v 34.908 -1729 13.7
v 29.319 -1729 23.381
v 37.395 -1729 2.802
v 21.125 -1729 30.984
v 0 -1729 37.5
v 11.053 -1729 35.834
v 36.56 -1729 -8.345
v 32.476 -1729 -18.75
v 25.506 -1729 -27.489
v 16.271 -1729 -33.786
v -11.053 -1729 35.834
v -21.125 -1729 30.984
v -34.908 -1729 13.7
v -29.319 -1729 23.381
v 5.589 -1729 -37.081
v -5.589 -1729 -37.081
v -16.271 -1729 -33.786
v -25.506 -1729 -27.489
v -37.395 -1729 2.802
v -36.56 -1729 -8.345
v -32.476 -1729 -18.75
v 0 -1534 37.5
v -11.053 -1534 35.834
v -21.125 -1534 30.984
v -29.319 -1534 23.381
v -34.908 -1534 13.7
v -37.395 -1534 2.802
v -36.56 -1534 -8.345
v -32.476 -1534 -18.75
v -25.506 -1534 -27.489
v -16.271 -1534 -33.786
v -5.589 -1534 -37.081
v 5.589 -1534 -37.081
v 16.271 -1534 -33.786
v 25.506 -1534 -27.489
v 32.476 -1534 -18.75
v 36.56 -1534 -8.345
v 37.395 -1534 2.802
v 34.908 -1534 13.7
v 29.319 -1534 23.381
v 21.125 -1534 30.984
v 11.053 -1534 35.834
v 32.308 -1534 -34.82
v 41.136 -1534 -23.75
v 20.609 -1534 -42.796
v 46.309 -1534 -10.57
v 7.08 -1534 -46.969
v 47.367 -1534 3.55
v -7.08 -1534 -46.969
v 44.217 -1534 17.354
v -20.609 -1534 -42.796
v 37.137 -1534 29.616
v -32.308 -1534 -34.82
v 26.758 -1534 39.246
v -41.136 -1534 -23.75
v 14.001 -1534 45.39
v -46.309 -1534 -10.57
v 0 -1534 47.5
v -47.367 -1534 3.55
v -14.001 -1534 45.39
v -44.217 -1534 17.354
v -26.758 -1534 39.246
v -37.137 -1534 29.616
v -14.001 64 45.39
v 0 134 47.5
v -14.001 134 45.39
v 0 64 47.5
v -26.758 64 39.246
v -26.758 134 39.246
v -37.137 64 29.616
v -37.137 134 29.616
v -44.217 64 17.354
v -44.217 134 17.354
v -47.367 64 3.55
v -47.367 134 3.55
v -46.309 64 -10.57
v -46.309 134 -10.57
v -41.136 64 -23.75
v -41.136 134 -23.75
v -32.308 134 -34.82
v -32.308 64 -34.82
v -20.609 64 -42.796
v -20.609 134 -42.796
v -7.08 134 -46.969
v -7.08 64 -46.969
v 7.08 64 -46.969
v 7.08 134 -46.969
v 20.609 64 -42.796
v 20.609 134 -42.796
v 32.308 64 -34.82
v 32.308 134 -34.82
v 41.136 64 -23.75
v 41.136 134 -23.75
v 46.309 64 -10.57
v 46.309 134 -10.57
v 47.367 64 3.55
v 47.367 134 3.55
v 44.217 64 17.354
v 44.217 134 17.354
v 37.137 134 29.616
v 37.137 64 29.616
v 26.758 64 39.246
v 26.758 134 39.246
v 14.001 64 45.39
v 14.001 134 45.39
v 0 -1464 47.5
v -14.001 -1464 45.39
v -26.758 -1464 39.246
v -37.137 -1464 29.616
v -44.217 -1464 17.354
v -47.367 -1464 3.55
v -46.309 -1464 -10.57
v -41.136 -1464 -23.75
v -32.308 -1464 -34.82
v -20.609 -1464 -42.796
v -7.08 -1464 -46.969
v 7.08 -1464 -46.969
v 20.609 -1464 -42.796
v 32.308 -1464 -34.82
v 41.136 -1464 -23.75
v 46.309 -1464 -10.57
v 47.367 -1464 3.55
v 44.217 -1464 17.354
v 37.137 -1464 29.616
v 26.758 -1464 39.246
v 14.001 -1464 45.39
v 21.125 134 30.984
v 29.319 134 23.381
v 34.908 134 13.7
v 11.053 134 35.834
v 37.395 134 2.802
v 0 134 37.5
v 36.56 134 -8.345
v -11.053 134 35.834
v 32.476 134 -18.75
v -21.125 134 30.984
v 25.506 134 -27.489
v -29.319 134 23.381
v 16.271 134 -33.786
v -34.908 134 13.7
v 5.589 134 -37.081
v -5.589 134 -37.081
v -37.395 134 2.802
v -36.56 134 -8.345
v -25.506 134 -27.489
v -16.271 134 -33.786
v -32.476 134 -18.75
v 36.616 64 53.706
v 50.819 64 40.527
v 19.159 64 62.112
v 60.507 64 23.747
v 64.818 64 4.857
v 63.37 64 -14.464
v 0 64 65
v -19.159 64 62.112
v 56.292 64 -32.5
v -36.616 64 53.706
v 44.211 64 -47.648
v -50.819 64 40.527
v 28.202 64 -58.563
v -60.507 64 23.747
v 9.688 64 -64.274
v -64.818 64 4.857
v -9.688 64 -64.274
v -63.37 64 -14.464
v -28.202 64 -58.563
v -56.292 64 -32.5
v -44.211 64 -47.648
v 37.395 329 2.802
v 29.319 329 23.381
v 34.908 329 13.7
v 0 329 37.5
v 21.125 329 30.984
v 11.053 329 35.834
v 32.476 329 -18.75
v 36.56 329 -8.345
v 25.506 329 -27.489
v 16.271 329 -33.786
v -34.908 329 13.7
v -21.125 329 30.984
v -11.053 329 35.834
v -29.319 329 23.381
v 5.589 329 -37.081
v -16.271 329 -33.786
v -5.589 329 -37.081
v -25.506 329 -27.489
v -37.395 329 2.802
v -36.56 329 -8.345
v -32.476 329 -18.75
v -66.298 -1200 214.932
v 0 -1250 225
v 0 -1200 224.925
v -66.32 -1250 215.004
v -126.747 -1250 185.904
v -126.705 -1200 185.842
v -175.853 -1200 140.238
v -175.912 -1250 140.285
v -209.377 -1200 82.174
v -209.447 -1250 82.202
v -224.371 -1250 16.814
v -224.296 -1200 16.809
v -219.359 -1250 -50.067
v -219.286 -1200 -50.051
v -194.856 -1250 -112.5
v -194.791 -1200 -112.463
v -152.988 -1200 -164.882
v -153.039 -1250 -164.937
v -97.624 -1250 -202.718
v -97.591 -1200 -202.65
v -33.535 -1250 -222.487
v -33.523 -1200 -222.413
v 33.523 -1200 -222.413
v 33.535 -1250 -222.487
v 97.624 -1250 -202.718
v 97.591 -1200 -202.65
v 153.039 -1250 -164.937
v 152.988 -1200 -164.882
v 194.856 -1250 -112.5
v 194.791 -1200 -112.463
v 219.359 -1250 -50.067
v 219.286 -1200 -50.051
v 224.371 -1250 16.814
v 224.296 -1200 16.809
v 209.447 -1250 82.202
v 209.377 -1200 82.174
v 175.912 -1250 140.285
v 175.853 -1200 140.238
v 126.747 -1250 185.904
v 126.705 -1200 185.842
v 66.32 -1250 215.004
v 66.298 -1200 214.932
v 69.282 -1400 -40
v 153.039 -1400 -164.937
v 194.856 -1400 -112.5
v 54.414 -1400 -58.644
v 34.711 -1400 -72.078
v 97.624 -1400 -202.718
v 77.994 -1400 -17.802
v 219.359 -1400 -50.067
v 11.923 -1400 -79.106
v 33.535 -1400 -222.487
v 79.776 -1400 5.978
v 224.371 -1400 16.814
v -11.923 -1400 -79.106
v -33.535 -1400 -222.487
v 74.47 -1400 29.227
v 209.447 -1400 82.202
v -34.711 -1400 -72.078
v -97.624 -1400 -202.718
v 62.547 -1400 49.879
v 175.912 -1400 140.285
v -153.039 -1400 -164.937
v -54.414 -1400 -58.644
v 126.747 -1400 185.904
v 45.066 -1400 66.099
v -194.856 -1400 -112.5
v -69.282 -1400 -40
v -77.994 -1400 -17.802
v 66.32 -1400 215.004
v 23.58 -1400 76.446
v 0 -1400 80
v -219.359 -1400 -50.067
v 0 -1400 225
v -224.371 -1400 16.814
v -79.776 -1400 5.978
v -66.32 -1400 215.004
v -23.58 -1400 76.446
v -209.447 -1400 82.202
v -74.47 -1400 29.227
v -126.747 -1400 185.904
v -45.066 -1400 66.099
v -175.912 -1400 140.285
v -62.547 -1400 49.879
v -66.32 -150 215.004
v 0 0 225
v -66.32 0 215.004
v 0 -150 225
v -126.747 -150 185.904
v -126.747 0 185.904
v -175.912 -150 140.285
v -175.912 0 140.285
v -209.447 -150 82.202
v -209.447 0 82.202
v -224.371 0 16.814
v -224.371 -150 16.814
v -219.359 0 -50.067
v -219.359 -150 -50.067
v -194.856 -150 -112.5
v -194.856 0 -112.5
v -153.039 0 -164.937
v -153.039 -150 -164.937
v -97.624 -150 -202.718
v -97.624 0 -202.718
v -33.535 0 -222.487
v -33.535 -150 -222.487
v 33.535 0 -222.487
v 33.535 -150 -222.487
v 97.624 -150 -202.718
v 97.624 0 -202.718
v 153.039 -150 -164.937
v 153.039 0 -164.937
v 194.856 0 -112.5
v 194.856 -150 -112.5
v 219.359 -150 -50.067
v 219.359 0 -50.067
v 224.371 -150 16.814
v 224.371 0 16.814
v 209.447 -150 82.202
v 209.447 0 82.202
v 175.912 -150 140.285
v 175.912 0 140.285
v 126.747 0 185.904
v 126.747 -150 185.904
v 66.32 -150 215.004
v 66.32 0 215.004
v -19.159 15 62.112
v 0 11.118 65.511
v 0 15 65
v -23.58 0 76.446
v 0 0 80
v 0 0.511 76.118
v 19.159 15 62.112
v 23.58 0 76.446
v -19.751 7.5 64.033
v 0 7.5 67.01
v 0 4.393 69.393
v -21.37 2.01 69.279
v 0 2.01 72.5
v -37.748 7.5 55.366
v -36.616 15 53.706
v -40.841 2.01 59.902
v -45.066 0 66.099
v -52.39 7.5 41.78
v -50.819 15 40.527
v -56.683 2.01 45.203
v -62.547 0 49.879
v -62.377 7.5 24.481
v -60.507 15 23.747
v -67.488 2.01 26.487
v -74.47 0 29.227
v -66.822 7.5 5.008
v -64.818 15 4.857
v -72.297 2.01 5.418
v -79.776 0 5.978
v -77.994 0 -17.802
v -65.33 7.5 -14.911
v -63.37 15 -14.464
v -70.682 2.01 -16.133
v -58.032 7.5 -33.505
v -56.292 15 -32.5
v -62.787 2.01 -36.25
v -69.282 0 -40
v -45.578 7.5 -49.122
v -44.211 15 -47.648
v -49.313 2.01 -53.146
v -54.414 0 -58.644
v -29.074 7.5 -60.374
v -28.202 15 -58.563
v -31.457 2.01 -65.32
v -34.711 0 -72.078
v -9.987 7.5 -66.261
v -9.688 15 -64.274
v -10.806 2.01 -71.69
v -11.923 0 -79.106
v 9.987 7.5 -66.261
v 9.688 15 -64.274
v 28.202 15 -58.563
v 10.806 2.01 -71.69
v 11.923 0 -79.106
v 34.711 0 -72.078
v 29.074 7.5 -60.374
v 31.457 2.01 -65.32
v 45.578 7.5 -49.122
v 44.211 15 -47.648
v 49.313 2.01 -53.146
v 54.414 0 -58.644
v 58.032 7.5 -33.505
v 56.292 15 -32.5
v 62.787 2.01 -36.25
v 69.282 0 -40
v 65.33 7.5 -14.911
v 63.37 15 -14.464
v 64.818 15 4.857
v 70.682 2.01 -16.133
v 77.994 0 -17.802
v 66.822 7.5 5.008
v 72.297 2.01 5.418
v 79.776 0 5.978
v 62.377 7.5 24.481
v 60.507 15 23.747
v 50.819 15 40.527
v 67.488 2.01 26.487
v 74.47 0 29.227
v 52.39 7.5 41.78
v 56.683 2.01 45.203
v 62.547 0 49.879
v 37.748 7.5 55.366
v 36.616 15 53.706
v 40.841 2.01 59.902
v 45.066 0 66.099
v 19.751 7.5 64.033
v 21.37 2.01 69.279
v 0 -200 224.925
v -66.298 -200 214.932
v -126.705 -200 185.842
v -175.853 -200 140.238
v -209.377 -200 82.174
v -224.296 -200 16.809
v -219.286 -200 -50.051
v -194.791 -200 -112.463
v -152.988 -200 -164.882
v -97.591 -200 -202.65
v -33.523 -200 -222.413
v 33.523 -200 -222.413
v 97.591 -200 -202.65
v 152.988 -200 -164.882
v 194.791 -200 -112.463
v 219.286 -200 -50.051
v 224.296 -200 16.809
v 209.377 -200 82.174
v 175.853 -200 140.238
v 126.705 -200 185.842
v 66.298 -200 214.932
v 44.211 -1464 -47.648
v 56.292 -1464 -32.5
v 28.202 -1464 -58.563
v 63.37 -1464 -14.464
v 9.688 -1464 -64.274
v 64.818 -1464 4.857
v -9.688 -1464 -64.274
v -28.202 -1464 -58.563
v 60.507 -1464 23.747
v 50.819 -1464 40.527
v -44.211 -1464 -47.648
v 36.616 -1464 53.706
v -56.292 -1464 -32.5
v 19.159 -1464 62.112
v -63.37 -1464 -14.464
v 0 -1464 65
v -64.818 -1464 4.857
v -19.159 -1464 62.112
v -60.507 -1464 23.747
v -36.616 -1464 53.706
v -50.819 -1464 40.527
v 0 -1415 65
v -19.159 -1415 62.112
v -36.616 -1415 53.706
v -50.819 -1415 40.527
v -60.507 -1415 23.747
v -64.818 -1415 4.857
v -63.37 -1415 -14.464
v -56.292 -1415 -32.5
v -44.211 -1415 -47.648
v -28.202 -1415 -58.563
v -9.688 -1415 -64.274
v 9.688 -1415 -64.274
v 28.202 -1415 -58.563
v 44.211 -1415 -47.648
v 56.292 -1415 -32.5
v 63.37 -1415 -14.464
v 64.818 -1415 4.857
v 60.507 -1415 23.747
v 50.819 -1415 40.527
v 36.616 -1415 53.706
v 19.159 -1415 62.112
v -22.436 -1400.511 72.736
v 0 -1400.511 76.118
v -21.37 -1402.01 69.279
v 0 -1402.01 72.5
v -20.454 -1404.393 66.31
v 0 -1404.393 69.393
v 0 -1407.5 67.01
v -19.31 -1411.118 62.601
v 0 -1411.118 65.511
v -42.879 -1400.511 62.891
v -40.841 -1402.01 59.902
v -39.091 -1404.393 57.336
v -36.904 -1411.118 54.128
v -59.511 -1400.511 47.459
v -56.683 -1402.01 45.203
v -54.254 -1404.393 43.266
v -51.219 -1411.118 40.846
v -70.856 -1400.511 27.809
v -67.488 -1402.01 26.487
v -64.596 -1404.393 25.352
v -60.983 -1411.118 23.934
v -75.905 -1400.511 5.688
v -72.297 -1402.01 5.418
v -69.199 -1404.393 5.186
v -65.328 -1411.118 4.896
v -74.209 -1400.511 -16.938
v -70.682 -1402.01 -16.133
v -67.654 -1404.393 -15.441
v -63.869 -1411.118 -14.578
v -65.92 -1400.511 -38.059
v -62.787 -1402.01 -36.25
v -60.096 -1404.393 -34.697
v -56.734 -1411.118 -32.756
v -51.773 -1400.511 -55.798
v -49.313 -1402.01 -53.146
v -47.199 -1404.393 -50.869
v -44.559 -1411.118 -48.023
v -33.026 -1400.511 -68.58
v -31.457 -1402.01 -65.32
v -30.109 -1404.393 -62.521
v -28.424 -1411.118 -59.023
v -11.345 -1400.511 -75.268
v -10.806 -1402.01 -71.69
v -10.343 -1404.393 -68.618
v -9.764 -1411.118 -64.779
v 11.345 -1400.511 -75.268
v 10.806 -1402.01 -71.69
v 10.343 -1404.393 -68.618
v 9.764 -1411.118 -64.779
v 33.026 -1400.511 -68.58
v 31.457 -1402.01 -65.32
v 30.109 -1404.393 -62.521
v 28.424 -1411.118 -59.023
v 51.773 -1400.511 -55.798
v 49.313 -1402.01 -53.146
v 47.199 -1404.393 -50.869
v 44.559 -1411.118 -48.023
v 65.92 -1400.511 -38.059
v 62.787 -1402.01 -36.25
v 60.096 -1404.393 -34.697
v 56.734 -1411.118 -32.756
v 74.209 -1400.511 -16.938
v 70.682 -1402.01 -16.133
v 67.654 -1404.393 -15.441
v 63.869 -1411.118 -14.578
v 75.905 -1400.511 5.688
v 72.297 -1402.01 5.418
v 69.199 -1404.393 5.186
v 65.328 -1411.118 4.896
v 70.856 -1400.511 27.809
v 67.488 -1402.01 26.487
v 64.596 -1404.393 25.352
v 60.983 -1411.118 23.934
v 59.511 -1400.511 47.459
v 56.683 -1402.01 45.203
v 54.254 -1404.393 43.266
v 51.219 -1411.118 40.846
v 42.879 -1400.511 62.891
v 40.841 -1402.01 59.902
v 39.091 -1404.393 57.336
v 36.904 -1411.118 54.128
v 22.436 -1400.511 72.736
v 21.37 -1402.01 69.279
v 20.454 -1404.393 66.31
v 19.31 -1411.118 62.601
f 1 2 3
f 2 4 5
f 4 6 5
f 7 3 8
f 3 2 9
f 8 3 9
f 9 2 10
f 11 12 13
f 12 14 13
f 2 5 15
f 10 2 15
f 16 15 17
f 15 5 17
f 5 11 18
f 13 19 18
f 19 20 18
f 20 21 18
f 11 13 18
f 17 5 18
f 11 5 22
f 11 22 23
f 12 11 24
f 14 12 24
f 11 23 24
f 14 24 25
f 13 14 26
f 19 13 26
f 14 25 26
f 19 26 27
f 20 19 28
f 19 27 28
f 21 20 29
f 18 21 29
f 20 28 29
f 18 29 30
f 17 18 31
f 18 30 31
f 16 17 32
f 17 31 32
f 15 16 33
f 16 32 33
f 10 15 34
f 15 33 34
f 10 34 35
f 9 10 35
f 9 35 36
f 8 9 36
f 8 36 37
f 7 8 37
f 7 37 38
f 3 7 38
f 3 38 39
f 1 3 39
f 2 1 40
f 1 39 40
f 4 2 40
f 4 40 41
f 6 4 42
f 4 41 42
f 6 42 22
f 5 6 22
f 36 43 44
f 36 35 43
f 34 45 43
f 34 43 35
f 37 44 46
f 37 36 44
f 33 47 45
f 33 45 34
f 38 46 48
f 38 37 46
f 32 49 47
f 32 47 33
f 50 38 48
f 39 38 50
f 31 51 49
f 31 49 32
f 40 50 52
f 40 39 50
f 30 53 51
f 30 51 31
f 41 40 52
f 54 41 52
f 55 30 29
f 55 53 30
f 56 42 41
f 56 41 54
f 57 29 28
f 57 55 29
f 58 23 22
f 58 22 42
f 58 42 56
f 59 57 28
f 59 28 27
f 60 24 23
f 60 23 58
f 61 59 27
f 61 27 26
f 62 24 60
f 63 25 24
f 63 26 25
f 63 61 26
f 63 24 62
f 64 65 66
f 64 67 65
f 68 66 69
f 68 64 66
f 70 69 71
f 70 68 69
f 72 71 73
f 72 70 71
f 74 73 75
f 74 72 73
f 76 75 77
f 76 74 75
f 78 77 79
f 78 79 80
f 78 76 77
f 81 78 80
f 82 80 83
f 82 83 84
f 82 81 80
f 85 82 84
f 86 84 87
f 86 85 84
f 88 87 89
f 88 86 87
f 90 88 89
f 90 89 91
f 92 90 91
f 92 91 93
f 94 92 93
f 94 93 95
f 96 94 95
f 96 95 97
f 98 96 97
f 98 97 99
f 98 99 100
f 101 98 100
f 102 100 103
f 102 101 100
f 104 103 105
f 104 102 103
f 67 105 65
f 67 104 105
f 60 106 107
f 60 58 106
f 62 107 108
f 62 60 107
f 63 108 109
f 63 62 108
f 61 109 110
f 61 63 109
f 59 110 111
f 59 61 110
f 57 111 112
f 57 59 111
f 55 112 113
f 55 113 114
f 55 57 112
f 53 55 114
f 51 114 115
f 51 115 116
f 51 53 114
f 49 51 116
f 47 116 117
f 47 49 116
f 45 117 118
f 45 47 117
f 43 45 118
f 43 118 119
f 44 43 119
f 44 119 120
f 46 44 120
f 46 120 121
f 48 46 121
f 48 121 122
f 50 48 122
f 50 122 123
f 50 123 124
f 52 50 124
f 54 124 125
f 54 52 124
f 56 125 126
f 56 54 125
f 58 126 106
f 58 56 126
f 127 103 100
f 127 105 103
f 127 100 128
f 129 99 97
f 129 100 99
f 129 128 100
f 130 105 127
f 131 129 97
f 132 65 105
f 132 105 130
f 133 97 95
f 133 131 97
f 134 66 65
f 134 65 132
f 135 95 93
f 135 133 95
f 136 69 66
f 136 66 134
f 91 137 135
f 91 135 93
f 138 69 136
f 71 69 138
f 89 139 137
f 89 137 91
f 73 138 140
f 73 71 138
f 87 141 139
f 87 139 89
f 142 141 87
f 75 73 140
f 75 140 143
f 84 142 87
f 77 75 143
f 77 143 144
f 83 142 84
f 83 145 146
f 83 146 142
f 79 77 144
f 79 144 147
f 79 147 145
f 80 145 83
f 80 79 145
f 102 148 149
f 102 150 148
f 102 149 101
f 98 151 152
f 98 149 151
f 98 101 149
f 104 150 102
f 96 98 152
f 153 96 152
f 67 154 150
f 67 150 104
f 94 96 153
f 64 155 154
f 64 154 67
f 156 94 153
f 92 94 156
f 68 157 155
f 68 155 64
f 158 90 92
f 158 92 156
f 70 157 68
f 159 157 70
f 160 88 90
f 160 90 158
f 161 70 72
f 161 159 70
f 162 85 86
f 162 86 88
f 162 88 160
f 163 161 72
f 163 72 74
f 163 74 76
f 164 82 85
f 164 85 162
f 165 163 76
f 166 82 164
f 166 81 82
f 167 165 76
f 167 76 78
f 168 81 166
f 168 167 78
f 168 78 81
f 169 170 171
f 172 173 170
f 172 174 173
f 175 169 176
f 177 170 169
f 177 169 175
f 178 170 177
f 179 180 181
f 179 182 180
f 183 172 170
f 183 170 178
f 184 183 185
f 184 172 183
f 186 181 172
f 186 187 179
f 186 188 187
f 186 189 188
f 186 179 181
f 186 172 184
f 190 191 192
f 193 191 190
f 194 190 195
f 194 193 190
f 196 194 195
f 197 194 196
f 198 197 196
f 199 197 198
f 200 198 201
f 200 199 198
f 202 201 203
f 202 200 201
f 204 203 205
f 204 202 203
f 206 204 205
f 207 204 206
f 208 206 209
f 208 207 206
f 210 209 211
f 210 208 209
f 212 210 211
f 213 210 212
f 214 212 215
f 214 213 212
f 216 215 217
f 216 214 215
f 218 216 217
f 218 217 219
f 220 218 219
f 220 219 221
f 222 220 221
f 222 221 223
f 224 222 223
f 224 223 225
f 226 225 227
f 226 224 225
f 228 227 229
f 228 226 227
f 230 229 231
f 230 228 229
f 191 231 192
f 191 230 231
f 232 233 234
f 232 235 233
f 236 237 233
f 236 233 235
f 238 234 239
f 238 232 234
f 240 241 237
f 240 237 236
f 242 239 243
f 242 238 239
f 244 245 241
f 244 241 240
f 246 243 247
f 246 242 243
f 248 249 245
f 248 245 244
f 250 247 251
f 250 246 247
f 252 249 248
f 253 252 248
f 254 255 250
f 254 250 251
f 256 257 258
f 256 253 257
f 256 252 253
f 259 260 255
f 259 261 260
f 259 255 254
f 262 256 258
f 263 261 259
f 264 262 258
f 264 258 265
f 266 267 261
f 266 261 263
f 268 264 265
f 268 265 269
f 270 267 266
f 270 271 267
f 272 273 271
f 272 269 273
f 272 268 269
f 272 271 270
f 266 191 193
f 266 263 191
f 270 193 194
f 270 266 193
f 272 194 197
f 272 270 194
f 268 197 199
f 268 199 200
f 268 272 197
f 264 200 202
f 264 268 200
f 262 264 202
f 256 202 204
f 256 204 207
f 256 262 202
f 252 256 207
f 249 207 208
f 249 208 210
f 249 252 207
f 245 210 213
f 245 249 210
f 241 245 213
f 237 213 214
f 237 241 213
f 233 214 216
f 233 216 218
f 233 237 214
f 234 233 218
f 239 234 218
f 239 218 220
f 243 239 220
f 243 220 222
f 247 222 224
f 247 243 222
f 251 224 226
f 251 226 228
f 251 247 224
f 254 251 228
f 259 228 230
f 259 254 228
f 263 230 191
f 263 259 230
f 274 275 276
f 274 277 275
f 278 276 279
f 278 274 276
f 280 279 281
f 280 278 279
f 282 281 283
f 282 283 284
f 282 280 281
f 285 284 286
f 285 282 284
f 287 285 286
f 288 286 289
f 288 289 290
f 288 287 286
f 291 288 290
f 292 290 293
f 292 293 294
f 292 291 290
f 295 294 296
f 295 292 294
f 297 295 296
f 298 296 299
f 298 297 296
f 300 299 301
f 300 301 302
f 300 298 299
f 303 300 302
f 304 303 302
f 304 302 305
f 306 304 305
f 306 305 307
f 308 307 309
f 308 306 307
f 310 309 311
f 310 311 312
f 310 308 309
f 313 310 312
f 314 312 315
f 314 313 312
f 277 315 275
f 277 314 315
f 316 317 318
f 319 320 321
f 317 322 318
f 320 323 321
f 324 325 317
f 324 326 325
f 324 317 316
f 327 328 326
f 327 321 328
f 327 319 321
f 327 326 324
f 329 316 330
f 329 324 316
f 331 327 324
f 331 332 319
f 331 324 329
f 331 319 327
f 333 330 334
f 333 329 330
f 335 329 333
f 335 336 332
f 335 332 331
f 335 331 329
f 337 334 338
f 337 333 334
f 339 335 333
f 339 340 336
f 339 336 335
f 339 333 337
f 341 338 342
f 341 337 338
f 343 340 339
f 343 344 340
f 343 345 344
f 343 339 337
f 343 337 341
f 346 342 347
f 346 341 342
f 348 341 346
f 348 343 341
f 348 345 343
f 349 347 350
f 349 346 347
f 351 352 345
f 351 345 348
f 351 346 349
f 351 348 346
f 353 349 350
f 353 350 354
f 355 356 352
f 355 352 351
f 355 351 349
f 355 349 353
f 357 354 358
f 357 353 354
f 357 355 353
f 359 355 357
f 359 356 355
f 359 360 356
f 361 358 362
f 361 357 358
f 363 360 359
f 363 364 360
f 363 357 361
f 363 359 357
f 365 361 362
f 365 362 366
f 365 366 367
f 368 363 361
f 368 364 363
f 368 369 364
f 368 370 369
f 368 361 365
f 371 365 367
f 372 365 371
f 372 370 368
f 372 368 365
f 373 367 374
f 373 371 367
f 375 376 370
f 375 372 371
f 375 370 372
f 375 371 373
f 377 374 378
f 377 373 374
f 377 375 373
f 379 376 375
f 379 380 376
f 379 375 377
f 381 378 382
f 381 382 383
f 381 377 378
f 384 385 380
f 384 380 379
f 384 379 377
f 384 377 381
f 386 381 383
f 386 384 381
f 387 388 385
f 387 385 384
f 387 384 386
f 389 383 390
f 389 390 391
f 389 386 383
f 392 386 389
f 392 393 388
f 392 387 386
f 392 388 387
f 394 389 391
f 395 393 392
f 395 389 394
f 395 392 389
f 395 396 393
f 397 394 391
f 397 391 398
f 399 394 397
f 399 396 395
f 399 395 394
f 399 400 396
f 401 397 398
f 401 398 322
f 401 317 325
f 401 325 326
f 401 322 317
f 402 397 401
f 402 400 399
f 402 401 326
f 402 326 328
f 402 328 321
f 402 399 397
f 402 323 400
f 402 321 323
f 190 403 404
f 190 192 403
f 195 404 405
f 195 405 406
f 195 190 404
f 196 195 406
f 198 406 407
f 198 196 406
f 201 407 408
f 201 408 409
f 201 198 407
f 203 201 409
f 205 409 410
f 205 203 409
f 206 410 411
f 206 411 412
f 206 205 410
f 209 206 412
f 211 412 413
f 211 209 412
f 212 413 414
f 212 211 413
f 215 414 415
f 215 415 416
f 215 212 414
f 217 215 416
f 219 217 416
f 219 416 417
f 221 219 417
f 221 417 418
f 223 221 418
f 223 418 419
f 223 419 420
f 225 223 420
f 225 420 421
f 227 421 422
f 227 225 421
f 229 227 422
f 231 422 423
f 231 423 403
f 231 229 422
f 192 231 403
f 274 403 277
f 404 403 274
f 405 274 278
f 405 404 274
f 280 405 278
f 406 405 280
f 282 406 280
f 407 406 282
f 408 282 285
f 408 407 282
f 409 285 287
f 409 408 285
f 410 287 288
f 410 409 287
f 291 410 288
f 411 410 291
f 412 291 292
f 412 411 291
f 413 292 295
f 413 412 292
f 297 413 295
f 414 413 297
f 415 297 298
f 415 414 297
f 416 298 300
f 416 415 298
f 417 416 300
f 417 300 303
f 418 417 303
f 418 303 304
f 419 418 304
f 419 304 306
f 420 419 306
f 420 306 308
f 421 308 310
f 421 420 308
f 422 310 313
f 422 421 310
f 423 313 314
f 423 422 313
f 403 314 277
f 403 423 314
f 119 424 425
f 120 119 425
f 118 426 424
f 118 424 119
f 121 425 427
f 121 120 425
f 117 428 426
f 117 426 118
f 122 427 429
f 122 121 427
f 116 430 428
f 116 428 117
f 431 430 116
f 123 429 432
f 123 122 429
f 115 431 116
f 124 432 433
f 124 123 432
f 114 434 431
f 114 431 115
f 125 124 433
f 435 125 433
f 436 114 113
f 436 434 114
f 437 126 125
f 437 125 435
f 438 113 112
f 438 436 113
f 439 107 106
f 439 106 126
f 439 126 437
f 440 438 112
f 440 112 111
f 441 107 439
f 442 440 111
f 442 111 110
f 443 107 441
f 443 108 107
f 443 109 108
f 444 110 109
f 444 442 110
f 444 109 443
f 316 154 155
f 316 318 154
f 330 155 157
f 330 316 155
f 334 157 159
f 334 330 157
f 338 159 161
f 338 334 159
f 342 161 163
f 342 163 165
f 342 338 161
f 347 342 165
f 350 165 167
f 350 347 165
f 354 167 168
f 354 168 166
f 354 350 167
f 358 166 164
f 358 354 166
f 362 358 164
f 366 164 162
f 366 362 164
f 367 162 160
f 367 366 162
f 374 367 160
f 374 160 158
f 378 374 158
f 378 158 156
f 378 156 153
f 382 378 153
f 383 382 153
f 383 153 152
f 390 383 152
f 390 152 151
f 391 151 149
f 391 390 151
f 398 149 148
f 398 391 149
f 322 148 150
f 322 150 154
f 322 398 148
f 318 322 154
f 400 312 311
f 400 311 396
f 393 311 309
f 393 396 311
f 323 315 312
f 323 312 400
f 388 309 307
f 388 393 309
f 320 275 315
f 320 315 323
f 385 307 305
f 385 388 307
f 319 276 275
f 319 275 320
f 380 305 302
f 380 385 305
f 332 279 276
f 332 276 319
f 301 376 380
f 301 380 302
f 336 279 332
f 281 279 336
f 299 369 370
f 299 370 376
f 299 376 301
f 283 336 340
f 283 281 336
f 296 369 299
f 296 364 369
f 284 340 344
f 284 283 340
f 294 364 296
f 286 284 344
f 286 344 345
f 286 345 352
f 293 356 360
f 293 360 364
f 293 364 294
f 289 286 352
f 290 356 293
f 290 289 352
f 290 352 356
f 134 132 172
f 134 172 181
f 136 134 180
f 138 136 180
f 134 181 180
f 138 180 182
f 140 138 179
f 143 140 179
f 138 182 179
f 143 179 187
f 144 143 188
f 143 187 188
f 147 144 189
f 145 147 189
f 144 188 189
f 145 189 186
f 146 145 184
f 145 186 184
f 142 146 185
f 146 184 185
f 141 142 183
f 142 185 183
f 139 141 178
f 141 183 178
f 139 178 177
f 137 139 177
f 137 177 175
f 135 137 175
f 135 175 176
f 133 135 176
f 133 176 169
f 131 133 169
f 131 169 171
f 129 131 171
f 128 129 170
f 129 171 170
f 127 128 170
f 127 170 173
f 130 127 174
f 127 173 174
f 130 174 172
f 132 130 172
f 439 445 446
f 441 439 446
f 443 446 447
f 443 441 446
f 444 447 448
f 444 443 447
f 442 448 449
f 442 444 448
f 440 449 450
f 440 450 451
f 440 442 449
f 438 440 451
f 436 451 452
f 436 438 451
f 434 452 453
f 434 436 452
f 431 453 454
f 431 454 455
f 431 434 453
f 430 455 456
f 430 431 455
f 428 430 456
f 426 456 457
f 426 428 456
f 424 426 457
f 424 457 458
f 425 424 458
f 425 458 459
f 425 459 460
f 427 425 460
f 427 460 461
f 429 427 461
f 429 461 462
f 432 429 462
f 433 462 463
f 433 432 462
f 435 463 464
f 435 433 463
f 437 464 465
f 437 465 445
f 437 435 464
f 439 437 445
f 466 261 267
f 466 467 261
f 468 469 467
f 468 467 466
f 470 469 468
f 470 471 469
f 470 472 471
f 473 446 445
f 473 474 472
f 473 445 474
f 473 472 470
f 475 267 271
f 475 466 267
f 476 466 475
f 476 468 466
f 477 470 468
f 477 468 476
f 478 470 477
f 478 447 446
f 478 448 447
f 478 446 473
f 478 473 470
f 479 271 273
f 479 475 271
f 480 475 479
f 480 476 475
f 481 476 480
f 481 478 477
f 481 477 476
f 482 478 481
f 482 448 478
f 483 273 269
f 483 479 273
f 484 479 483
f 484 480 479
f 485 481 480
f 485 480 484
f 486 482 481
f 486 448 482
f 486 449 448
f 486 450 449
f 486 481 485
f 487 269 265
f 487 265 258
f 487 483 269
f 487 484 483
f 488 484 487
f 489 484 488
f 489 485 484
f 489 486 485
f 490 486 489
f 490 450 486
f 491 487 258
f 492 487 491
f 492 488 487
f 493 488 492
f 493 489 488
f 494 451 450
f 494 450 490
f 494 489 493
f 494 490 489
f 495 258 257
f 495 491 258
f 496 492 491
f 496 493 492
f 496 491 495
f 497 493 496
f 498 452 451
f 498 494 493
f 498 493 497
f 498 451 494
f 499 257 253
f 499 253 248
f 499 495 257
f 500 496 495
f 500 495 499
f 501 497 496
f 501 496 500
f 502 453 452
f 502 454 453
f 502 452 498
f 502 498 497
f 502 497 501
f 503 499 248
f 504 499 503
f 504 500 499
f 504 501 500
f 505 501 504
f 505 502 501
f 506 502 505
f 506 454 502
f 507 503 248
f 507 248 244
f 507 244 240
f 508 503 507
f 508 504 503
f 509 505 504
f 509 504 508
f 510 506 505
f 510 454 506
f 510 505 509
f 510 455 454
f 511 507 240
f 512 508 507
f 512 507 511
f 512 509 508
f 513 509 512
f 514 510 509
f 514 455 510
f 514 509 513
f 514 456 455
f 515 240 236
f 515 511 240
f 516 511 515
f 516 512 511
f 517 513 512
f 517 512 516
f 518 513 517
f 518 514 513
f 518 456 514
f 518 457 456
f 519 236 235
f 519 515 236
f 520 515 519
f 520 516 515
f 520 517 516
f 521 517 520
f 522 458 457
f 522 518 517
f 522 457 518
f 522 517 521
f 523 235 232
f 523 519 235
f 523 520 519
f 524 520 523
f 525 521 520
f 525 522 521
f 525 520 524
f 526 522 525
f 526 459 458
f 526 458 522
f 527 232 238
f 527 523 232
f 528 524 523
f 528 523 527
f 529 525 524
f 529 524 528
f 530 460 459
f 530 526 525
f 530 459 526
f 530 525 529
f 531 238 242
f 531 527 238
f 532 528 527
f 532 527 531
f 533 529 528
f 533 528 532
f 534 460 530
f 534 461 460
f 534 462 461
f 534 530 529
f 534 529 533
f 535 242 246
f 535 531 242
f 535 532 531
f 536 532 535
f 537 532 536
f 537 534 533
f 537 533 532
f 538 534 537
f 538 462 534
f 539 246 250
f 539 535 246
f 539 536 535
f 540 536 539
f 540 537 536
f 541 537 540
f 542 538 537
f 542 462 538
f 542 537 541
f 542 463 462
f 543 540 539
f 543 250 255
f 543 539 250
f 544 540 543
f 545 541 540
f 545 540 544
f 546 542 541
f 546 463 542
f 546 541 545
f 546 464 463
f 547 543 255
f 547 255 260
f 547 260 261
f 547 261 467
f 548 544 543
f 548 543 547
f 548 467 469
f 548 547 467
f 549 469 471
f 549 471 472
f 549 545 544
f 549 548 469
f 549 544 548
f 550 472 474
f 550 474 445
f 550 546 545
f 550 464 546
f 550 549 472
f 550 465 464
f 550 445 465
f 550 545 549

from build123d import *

# Parameters (mm, degrees)
F0_W = 195
F0_H = 37.5


with BuildPart() as f1:
    # F0 (on Right) → F1 (revolve)
    with BuildSketch(Plane.YZ):
        with BuildLine():
            ThreePointArc((15, 65), (4.393398, 69.393398), (0, 80))
            Line((0, 80), (0, 225))
            Line((0, 225), (-150, 225))
            Line((-150, 225), (-200, 224.925))
            Line((-200, 224.925), (-700, 224.925))
            Line((-700, 224.925), (-700, 0))
            Line((-700, 0), (0, 0))
            Line((0, 0), (64, 0))
            Line((64, 0), (64, 47.5))
            Line((64, 47.5), (64, 65))
            Line((64, 65), (15, 65))
        make_face()
        Polygon((134, 47.5), (64, 47.5), (64, 0), (134, 0), (134, 37.5), align=None)
        Polygon((-700, 0), (-700, 224.925), (-1200, 224.925), (-1250, 225), (-1400, 225), (-1400, 80), (-1400, 0), align=None)
        with Locations((231.5, 18.75)):
            Rectangle(F0_W, F0_H)
        with BuildLine():
            Line((-1464, 0), (-1400, 0))
            Line((-1400, 0), (-1400, 80))
            ThreePointArc((-1400, 80), (-1404.393398, 69.393398), (-1415, 65))
            Line((-1415, 65), (-1464, 65))
            Line((-1464, 65), (-1464, 47.5))
            Line((-1464, 47.5), (-1464, 0))
        make_face()
        Polygon((-1534, 0), (-1464, 0), (-1464, 47.5), (-1534, 47.5), (-1534, 37.5), align=None)
        with Locations((-1631.5, 18.75)):
            Rectangle(F0_W, F0_H)
    revolve(axis=Axis((0, -350, 0), (0, -1, 0)))


solid = f1.part
